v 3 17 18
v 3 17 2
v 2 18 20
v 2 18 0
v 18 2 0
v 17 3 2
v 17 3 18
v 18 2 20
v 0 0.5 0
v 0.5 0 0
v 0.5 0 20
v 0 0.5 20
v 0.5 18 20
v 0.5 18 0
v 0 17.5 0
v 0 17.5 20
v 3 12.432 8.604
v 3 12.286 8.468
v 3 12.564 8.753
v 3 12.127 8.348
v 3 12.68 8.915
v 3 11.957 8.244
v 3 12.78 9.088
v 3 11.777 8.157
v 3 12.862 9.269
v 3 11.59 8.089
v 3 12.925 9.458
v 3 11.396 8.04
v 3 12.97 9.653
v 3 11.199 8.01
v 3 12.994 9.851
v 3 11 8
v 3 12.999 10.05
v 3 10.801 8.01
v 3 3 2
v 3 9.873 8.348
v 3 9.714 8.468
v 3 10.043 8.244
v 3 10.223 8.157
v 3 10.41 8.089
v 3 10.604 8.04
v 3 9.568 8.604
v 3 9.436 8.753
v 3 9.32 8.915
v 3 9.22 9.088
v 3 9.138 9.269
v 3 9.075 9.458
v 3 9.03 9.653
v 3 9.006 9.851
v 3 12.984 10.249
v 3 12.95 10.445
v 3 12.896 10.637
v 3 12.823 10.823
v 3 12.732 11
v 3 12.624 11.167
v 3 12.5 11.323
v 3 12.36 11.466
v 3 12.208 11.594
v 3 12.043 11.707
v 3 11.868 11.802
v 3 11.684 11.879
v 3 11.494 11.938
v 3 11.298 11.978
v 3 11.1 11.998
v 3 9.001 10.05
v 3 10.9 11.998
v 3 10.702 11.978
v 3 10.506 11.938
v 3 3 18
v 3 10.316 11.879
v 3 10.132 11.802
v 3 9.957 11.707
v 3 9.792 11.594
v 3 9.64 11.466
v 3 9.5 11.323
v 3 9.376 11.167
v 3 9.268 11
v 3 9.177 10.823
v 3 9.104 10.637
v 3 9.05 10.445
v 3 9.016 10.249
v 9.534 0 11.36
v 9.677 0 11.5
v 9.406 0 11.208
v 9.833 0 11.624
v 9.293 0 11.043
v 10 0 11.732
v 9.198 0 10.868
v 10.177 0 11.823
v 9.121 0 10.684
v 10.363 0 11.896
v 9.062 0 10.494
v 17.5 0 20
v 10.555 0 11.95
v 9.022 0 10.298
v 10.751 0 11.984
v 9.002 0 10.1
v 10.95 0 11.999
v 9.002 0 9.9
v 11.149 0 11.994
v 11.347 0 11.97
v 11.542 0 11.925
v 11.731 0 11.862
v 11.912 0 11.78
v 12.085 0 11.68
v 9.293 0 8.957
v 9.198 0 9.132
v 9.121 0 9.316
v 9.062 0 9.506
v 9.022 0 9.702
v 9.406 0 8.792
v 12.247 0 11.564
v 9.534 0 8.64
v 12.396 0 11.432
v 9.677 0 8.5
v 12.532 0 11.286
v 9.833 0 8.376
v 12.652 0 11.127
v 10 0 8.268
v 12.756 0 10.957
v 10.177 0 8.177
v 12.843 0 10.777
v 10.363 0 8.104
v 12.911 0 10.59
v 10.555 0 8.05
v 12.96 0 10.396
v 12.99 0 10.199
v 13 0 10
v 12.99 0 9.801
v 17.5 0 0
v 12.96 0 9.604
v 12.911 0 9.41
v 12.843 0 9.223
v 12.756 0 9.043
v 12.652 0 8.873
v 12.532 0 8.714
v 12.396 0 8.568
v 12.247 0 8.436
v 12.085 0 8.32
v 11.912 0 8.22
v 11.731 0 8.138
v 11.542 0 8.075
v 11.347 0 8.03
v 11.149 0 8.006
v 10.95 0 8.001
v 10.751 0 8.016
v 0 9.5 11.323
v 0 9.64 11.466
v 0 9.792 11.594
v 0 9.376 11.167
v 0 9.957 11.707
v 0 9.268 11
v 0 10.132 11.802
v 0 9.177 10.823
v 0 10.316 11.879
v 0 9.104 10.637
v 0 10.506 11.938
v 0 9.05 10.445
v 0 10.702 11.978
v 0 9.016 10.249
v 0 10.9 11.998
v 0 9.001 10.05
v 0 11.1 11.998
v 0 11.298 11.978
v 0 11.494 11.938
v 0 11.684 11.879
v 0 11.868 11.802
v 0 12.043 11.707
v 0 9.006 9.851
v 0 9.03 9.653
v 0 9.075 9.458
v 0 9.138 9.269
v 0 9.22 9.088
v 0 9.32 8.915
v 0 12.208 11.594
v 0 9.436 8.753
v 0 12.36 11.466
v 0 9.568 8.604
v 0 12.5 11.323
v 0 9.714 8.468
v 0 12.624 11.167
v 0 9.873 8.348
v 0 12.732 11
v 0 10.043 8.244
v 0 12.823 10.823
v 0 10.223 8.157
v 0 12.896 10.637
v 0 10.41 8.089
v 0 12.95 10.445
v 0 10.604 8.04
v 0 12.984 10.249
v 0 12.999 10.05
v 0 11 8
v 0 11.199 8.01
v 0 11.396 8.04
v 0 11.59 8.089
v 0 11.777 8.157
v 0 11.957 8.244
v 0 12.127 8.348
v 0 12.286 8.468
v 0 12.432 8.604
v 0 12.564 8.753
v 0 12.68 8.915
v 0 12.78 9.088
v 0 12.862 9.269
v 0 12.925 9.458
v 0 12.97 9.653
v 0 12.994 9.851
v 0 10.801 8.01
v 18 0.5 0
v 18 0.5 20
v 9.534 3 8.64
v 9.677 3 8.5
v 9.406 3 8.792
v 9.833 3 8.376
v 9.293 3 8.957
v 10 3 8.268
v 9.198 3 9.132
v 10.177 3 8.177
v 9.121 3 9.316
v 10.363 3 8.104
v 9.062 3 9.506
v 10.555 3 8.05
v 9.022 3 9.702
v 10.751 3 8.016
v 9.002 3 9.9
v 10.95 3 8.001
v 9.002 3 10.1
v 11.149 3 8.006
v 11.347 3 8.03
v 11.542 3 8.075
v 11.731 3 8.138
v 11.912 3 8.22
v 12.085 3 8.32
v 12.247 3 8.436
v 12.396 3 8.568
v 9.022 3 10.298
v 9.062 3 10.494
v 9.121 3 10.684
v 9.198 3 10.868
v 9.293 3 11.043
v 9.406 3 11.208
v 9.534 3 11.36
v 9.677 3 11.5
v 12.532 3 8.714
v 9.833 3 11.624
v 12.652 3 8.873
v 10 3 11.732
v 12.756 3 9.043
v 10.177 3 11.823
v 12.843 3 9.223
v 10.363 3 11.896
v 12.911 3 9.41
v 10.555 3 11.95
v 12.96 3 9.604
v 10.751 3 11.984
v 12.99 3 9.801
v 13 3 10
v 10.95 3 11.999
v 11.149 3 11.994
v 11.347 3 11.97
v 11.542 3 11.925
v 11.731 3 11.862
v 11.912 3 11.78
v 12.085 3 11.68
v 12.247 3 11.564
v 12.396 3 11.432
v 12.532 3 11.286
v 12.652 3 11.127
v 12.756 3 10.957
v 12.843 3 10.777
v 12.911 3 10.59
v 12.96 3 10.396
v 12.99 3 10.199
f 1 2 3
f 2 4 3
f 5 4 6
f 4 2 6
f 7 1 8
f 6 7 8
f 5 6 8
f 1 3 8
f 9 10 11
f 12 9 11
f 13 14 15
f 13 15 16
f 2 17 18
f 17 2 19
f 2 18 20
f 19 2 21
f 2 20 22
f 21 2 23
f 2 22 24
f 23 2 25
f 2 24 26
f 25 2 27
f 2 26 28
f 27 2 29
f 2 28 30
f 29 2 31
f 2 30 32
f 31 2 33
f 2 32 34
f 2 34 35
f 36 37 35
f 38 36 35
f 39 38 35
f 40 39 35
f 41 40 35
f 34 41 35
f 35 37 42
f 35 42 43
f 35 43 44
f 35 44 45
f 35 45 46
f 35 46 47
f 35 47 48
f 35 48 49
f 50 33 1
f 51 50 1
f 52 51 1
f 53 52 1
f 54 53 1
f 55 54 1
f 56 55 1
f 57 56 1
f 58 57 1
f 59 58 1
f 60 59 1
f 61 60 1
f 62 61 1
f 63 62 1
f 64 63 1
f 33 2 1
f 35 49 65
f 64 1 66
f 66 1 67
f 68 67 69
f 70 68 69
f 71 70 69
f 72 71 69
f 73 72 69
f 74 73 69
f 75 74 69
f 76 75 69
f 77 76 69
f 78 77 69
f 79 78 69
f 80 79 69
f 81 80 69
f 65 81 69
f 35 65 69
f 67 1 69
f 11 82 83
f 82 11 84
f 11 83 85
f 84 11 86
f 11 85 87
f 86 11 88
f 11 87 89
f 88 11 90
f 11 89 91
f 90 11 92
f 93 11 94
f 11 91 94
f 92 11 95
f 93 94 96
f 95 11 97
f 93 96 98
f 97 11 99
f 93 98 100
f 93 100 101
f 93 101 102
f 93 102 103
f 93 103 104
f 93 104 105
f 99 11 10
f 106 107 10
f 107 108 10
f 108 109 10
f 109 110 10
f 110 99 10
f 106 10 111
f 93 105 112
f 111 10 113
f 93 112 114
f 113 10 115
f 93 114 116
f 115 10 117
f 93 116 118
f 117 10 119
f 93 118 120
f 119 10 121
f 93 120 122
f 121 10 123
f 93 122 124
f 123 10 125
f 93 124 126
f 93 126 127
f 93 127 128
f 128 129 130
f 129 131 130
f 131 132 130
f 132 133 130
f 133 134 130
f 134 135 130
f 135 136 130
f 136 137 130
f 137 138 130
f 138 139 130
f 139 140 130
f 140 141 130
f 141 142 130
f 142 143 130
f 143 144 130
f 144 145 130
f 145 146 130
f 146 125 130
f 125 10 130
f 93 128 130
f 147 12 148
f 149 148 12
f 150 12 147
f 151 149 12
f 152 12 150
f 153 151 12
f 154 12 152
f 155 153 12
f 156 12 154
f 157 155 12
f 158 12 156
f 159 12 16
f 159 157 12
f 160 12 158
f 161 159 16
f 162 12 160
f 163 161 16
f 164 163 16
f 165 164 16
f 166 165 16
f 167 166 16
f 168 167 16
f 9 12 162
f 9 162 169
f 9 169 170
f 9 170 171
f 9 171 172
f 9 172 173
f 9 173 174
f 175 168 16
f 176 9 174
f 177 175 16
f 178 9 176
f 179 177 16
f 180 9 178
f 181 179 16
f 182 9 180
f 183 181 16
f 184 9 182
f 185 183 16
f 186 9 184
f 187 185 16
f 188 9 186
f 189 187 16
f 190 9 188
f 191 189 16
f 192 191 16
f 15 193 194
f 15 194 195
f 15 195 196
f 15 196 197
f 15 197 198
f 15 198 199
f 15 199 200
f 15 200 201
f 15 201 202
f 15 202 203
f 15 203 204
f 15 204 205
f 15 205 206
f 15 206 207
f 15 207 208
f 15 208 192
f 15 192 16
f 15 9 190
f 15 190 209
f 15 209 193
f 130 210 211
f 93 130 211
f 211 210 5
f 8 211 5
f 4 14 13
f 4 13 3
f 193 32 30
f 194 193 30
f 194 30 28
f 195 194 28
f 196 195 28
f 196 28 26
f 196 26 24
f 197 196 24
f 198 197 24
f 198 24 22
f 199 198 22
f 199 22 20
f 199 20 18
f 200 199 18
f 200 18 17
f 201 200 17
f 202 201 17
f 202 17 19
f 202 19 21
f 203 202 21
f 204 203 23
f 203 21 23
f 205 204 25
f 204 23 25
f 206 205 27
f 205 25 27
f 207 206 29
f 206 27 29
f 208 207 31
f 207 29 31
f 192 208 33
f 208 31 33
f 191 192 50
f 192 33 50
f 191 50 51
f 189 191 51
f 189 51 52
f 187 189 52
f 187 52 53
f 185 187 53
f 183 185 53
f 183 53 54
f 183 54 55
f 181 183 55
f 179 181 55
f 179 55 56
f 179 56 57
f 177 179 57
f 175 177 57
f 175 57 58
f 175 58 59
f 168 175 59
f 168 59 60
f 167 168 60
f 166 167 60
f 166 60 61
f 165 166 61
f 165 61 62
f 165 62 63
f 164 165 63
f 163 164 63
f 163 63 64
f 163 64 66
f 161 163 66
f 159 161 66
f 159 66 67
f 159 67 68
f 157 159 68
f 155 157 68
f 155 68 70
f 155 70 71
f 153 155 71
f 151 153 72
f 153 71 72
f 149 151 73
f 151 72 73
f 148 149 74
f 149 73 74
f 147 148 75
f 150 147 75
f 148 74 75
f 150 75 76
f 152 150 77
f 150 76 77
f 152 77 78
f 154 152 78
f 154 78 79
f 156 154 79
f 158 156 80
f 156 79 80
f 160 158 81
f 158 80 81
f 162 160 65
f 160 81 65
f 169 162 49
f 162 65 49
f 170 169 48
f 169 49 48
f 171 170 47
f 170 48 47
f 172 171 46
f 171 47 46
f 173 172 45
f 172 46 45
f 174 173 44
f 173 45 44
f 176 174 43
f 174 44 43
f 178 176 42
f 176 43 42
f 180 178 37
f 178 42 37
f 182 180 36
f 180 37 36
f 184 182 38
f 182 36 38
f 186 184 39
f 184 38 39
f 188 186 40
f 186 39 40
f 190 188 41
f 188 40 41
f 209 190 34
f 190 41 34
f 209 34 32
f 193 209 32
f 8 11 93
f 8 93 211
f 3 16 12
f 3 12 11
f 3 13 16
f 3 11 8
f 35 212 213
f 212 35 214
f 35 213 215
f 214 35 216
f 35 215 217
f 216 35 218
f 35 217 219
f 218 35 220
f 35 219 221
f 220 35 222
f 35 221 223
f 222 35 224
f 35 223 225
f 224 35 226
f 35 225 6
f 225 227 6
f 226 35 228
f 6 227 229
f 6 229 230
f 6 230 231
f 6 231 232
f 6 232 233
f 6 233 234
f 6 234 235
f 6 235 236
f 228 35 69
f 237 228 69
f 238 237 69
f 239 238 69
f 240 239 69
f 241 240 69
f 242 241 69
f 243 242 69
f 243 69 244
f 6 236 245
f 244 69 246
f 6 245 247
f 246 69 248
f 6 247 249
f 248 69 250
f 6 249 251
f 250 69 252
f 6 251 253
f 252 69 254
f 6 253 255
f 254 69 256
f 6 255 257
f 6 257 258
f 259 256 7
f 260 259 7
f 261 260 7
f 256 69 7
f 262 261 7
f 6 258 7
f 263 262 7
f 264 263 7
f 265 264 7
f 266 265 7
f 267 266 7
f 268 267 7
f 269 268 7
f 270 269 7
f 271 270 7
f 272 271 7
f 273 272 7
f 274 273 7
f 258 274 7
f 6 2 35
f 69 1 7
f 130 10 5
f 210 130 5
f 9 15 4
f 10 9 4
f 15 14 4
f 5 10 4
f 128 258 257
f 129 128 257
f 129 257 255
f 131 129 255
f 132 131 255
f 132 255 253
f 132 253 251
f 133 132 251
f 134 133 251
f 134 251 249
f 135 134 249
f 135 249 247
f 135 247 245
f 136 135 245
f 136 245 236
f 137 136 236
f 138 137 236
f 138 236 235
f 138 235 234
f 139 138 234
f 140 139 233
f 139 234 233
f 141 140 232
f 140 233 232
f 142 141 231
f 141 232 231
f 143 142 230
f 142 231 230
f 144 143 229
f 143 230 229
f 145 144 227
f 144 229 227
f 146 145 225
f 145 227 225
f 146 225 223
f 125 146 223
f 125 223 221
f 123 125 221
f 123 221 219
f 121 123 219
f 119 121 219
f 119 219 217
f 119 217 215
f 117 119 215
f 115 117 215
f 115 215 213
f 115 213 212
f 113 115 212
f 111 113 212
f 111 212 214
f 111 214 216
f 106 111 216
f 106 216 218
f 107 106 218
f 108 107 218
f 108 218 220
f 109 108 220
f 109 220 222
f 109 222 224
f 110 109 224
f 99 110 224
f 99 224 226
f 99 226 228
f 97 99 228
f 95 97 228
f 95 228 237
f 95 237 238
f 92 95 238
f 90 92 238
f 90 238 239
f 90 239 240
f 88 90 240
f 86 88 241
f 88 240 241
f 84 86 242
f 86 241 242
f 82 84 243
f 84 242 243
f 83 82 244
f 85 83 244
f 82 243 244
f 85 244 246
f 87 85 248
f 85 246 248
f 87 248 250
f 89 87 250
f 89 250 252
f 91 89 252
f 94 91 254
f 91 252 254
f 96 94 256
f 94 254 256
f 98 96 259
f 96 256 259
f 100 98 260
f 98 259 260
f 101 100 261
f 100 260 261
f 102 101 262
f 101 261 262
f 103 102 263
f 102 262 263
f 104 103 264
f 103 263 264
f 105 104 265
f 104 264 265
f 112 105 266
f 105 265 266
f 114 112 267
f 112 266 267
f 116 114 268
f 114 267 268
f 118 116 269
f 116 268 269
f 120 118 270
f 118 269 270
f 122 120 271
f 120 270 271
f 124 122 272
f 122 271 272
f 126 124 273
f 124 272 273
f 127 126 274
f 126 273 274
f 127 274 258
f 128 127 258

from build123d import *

# Parameters (mm, degrees)
ESQUISSE1_W             = 18
ESQUISSE1_H             = 18
BOSS_EXTRU_1_DEPTH      = 20
ENL_V_MAT_EXTRU_1_DEPTH = 20
ENL_V_START             = -2
ENL_V_MAT_EXTRU_2_DEPTH = 16
CHANFREIN1_SIZE         = 0.5
ESQUISSE4_R             = 2
ENL_V_MAT_EXTRU_3_DEPTH = 4
ESQUISSE5_R             = 2
ENL_V_MAT_EXTRU_4_DEPTH = 4


with BuildPart() as part:
    # Esquisse1 → Boss.-Extru.1 (new body)
    with BuildSketch(Plane.XY):
        with Locations((9, 9)):
            Rectangle(ESQUISSE1_W, ESQUISSE1_H)
    extrude(amount=BOSS_EXTRU_1_DEPTH)

    # Esquisse2 → Enlèv. mat.-Extru.1 (cut)
    with BuildSketch(Plane.XY.offset(20)):
        Polygon((18, 18), (2, 18), (18, 2), align=None)
    extrude(amount=-ENL_V_MAT_EXTRU_1_DEPTH, mode=Mode.SUBTRACT)

    # Esquisse3 → Enlèv. mat.-Extru.2 (cut)
    with BuildSketch(Plane.XY.offset(20).offset(ENL_V_START)):
        Polygon((3, 17), (3, 3), (17, 3), align=None)
    extrude(amount=-ENL_V_MAT_EXTRU_2_DEPTH, mode=Mode.SUBTRACT)

    # Chanfrein1
    chanfrein1_edges = [part.edges().sort_by_distance(p)[0] for p in [
        (0, 18, 10),
        (18, 0, 10),
        (0, 0, 10),
    ]]
    chamfer(chanfrein1_edges, length=CHANFREIN1_SIZE)

    # Esquisse4 → Enlèv. mat.-Extru.3 (cut, through all)
    with BuildSketch(Plane(origin=(3, 0, 0), x_dir=(0, 0, -1), z_dir=(1, 0, 0))):
        with Locations((-10, 11)):
            Circle(ESQUISSE4_R)
    extrude(amount=-ENL_V_MAT_EXTRU_3_DEPTH, mode=Mode.SUBTRACT)

    # Esquisse5 → Enlèv. mat.-Extru.4 (cut, through all)
    with BuildSketch(Plane(origin=(0, 3, 0), x_dir=(1, 0, 0), z_dir=(0, 1, 0))):
        with Locations((11, -10)):
            Circle(ESQUISSE5_R)
    extrude(amount=-ENL_V_MAT_EXTRU_4_DEPTH, mode=Mode.SUBTRACT)


solid = part.part
